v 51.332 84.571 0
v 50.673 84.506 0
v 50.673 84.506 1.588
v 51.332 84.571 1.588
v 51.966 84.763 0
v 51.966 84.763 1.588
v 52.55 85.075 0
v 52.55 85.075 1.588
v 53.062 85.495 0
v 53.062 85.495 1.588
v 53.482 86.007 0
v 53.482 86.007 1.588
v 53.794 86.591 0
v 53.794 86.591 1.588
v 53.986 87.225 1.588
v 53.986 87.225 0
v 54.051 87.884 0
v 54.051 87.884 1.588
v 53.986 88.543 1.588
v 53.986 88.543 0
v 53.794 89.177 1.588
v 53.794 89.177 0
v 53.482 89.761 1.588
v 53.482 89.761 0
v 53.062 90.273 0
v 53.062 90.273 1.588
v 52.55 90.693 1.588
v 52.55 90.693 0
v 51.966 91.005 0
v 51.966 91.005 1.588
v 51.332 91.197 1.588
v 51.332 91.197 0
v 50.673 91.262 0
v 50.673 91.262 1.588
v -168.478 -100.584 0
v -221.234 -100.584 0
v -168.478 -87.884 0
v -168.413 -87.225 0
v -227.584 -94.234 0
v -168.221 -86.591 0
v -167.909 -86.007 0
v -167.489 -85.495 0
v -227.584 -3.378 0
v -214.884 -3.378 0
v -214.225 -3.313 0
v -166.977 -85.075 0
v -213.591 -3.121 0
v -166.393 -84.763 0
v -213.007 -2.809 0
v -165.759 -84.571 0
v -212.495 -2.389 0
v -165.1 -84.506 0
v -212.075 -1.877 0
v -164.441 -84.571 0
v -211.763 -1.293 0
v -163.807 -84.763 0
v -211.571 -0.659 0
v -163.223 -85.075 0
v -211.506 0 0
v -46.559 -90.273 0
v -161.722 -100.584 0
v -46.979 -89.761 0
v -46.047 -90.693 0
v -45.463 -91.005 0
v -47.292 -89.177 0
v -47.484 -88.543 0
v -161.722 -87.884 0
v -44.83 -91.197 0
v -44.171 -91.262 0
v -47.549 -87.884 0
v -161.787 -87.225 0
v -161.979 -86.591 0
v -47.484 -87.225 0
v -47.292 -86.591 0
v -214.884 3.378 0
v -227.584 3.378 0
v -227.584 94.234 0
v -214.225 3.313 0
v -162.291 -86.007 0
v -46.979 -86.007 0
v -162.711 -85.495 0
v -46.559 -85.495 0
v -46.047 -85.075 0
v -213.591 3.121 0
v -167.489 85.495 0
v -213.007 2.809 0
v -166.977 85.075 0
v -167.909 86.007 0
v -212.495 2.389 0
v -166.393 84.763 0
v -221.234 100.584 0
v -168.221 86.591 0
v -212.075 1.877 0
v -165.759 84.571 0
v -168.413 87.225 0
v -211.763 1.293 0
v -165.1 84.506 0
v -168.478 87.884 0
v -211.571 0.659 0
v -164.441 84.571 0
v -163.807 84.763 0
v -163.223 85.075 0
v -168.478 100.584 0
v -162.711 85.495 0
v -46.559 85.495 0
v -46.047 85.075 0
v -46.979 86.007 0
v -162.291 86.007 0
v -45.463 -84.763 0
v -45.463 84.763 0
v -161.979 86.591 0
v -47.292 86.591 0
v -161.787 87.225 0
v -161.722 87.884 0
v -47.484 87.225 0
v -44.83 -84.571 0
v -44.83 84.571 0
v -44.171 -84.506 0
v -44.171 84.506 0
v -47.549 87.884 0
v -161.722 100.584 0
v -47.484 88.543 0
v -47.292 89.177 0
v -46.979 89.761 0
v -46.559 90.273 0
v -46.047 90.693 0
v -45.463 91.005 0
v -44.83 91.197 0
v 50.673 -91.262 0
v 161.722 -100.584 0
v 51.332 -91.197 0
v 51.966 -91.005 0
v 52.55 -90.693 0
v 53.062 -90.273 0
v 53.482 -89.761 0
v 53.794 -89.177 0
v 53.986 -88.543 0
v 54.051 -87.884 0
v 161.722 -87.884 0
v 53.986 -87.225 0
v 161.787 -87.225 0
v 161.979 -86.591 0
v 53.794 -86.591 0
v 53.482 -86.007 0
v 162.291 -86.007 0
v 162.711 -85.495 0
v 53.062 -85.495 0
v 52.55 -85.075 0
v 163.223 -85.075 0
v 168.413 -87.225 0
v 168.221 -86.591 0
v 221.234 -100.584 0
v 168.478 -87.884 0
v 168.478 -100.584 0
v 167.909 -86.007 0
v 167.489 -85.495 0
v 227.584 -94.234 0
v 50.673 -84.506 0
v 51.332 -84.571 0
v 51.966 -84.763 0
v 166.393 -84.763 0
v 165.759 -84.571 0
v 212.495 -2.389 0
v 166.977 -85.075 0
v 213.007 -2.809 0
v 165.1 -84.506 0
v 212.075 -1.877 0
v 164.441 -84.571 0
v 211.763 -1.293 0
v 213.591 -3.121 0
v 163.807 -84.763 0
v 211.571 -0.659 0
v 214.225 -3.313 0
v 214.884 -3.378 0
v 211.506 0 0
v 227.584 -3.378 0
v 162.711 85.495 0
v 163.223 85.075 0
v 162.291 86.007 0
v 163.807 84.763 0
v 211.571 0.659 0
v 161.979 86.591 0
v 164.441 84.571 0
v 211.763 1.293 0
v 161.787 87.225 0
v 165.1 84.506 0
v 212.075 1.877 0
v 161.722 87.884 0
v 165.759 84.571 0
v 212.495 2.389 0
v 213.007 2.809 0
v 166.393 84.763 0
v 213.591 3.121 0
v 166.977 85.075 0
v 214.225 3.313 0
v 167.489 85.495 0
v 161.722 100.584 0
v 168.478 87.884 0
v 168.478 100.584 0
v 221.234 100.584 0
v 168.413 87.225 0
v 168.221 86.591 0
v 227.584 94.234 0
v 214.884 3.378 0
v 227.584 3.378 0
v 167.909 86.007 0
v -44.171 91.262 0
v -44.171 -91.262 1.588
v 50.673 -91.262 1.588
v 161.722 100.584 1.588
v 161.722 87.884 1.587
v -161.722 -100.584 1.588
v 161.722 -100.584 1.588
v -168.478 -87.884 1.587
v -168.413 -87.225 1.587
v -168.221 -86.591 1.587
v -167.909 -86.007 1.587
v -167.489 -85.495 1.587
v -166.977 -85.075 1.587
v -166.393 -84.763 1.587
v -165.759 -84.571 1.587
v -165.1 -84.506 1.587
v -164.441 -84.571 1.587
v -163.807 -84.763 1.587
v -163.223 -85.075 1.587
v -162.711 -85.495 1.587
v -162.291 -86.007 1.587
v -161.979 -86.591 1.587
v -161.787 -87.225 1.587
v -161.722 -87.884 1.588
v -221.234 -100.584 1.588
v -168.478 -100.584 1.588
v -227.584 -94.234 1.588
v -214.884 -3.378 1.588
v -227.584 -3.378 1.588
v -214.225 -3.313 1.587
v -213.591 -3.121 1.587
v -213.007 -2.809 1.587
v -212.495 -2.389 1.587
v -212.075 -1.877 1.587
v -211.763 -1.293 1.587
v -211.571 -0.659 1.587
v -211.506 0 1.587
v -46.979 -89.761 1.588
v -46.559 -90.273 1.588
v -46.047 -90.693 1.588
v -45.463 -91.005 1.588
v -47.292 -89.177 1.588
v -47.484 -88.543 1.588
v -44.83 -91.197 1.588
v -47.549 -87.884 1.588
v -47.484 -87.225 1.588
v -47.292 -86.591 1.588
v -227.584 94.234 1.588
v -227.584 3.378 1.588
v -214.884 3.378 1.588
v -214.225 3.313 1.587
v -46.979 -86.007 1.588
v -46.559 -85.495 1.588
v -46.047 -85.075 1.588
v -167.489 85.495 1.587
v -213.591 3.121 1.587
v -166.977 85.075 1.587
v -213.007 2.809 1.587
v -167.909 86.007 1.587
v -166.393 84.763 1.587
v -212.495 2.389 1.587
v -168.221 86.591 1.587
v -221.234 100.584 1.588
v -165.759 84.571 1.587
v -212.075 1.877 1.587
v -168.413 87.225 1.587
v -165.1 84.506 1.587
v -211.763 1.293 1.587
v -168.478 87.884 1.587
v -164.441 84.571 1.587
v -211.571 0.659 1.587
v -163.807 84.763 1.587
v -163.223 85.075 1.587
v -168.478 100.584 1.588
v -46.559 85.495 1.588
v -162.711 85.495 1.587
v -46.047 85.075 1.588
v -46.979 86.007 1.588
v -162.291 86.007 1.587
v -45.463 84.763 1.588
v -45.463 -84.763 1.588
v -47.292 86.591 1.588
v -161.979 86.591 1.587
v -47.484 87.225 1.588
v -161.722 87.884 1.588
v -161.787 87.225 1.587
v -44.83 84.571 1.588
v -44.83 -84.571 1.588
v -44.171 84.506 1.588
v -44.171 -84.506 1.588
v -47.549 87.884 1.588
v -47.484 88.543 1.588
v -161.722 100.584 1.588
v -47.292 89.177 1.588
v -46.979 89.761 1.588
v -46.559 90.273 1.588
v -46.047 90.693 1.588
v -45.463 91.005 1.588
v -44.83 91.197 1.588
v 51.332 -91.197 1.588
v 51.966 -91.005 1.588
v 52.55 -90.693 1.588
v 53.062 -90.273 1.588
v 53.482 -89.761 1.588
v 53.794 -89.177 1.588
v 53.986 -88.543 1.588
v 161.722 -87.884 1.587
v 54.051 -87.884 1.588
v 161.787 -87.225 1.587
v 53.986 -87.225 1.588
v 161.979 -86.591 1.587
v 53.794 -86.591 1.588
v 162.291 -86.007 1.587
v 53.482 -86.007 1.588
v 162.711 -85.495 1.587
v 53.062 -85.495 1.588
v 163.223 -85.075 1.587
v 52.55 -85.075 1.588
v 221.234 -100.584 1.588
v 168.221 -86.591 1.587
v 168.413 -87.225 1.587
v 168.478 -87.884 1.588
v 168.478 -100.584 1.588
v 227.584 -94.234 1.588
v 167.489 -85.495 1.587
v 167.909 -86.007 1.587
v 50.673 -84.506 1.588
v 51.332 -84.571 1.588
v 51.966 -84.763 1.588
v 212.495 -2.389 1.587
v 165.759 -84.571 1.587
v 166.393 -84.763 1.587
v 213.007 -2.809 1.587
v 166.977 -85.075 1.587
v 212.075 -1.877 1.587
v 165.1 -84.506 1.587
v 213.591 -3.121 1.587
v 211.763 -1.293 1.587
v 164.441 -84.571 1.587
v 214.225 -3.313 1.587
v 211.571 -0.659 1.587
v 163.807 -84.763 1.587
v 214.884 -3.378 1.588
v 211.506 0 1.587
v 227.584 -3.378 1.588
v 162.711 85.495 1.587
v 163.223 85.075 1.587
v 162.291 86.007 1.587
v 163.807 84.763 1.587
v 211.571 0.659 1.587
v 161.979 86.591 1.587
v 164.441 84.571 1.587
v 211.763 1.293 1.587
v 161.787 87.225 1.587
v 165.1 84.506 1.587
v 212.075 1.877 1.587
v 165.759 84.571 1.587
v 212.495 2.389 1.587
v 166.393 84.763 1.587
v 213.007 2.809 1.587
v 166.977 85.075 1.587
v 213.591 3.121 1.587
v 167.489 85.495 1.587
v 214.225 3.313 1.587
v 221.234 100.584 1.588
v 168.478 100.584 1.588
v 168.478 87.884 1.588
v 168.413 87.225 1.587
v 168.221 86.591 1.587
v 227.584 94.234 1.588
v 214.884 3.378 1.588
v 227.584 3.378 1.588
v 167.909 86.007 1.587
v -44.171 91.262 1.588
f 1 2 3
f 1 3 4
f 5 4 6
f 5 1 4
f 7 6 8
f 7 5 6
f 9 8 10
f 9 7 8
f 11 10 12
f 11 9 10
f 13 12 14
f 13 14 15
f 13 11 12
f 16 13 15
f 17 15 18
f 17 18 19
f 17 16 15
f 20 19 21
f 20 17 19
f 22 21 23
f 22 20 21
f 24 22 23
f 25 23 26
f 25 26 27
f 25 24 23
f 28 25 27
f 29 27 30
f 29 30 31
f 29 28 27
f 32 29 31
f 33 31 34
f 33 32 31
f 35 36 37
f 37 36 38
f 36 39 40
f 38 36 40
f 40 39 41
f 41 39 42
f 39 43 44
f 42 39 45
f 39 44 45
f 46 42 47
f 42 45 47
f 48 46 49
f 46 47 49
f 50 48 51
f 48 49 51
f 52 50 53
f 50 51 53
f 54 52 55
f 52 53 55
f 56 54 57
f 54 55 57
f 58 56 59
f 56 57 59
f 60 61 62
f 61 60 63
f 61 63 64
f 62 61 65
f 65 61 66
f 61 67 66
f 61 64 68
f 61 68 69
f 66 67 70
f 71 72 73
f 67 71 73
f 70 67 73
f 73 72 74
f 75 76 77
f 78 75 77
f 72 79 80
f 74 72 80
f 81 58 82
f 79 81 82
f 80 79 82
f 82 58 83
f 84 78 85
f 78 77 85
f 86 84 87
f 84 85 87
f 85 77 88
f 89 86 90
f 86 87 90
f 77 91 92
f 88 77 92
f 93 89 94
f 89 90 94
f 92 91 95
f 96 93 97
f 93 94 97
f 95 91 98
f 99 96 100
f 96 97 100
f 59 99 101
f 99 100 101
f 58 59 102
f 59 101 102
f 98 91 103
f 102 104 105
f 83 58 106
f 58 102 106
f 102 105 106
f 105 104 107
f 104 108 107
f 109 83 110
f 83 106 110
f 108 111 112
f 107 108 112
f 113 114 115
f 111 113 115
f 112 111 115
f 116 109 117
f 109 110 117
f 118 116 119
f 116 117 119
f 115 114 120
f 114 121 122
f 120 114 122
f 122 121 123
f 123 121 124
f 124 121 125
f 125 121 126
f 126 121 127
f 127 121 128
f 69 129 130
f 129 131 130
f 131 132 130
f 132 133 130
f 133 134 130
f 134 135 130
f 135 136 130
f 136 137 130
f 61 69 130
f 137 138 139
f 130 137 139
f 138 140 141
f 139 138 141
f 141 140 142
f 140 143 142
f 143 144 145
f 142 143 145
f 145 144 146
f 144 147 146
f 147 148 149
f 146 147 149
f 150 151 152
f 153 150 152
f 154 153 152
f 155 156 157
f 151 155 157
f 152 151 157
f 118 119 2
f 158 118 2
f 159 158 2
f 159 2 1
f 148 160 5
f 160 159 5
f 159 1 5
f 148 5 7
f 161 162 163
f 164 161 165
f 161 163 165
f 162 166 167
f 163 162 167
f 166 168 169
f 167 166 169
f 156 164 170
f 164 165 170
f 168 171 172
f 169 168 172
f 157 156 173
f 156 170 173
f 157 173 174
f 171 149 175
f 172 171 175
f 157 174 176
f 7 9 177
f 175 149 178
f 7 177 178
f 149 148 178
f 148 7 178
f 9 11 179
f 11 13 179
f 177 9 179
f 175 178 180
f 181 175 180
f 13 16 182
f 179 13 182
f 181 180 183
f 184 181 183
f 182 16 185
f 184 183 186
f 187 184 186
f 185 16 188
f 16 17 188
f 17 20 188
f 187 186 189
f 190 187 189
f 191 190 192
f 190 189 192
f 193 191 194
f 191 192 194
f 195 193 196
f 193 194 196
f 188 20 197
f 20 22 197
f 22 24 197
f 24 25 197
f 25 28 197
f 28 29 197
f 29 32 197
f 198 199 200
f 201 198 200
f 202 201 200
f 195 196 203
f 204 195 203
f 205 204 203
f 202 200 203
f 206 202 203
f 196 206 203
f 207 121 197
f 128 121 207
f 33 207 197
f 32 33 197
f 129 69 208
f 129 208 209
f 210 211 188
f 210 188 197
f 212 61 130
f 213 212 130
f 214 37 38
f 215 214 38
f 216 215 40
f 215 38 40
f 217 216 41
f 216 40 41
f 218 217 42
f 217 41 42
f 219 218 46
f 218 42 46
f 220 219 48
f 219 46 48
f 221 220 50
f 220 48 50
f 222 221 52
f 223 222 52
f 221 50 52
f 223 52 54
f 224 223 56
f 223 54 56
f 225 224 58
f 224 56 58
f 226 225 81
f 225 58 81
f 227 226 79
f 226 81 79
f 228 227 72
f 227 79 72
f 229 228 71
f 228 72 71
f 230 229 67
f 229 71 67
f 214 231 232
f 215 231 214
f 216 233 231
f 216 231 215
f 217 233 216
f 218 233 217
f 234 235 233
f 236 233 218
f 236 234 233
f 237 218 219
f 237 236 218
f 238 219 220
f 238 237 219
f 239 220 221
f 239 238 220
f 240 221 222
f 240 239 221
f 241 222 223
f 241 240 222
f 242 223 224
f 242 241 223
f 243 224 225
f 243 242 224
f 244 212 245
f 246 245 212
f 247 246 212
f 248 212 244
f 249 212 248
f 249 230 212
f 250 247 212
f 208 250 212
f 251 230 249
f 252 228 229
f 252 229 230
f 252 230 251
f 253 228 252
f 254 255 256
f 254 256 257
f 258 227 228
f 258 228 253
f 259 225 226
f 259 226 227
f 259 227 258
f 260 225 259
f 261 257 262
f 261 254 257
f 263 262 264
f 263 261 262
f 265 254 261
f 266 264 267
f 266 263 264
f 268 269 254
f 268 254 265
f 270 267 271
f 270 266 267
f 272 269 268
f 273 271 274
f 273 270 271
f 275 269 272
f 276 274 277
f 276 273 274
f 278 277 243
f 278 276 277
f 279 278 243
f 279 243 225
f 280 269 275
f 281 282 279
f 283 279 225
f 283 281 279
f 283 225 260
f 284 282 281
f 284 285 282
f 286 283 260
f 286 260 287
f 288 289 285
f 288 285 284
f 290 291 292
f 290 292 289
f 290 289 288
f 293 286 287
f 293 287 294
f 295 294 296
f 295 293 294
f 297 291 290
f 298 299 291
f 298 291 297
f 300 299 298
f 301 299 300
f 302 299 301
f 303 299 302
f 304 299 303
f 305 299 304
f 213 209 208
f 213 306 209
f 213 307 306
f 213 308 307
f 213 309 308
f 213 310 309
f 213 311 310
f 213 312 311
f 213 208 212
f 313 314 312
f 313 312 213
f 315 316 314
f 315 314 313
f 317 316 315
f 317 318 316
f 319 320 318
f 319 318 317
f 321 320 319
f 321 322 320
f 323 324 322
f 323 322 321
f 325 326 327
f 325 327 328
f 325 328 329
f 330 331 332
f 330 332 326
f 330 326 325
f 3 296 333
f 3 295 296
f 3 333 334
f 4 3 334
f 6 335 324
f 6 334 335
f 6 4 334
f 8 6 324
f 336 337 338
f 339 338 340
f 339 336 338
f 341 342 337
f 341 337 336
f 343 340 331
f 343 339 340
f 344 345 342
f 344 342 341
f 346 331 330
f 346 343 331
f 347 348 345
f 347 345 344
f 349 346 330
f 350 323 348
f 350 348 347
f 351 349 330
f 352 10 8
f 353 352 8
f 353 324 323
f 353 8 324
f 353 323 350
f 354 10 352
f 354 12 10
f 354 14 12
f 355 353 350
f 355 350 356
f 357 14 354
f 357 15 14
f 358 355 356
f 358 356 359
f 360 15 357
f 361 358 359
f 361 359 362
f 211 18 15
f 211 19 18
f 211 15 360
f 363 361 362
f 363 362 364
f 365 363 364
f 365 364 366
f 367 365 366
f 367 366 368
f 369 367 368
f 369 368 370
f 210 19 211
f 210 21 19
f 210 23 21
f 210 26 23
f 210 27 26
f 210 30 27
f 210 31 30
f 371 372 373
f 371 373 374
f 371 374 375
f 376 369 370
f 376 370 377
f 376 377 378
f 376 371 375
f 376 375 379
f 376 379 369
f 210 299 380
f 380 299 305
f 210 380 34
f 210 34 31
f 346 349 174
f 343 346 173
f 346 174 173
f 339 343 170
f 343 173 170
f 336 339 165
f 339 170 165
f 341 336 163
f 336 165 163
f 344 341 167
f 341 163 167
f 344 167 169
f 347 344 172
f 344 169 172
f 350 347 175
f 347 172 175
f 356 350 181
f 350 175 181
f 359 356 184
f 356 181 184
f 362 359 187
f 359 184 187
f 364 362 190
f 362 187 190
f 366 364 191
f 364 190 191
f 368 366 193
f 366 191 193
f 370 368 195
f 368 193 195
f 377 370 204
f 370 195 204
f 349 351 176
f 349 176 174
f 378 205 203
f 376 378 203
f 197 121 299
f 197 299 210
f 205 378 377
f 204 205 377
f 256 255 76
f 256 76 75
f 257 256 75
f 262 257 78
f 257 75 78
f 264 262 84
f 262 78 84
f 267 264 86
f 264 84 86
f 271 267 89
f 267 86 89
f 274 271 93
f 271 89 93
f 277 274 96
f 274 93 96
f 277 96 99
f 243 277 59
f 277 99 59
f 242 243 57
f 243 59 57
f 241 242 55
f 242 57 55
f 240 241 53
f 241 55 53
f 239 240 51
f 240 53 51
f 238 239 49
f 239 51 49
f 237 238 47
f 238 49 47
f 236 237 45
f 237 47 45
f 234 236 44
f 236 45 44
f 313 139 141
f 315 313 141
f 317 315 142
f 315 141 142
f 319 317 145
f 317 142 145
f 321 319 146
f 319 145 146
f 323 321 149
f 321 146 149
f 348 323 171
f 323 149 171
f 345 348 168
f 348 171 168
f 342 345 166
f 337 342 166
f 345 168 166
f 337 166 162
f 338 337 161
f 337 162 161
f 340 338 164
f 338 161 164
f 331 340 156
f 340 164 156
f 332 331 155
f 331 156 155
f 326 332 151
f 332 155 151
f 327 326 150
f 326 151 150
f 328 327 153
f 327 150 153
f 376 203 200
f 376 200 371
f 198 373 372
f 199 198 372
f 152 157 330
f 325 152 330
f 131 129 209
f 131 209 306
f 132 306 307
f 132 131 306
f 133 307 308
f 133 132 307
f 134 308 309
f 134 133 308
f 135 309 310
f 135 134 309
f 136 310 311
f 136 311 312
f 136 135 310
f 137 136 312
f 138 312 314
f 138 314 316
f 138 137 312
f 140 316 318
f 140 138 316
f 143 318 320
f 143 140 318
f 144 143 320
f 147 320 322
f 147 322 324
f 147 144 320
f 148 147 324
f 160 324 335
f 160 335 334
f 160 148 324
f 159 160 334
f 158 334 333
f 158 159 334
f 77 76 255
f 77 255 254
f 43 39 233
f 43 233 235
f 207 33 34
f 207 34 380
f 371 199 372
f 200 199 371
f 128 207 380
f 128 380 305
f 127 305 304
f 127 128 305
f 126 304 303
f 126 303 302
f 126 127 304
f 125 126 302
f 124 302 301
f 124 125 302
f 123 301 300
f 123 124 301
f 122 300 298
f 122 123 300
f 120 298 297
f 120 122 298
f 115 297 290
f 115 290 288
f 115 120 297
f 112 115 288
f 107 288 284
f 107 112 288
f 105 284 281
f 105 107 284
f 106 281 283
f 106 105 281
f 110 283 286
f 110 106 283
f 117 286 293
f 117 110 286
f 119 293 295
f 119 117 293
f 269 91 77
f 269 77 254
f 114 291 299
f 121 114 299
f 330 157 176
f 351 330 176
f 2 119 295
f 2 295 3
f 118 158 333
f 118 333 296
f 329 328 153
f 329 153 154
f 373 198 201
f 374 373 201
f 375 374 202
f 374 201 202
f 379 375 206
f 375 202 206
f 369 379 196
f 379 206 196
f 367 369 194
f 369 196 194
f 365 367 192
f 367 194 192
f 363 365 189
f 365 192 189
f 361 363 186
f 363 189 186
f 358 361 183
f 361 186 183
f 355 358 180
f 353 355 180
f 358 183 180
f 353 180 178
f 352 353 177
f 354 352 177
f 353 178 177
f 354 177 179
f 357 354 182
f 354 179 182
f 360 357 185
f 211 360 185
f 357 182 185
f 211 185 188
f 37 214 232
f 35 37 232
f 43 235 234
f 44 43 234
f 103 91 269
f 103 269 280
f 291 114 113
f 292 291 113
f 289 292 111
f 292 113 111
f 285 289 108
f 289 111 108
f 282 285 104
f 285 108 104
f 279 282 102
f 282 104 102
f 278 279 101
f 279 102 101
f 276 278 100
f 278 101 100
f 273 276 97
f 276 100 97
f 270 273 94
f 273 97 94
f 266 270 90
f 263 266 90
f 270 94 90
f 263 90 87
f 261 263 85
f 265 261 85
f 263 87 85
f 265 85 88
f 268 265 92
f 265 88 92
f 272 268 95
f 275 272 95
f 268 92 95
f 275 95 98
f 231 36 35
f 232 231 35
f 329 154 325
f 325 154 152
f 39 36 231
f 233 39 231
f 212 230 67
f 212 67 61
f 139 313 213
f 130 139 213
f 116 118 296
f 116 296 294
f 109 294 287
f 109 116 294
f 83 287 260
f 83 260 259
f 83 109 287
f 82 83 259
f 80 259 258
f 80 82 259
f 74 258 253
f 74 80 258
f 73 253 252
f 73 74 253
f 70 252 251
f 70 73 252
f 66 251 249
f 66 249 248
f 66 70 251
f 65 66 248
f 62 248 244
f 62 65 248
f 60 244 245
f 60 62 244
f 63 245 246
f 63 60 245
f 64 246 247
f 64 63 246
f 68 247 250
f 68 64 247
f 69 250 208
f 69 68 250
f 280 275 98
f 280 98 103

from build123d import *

# Parameters (mm, degrees)
SKETCH1_W                   = 455.168
SKETCH1_H                   = 201.168
BOSS_EXTRUDE1_DEPTH         = 1.5875
F_1_4_CLEARANCE_HOLE1_D     = 6.7564
F_1_4_CLEARANCE_SLOT1_DEPTH = 1.5875
CHAMFER1_SIZE               = 6.35
CUT_EXTRUDE1_REACH          = 250.826
SKETCH6_W                   = 6.7564
SKETCH6_H                   = 14.478
CUT_EXTRUDE2_REACH          = 250.826
SKETCH7_W                   = 14.478
SKETCH7_H                   = 6.7564


# Read off the part's stored shape, not the designer's step: 1/4 Clearance Slot1
with BuildPart() as part:
    # Sketch1 → Boss-Extrude1 (new body)
    with BuildSketch(Plane.XY):
        Rectangle(SKETCH1_W, SKETCH1_H)
    extrude(amount=BOSS_EXTRUDE1_DEPTH)

    # 1/4 Clearance Hole1 (through all)
    with Locations(Plane.XY.offset(1.5875)):
        with Locations((-165.1, 87.884), (165.1, 87.884), (214.884, 0), (-214.884, 0), (-165.1, -87.884), (165.1, -87.884)):
            Hole(F_1_4_CLEARANCE_HOLE1_D / 2)

    # 1/4 Clearance Slot1 outline → 1/4 Clearance Slot1 (cut)
    with BuildSketch(Plane.XY):
        with BuildLine():
            Line((-44.1706, 84.5058), (50.673, 84.5058))
            ThreePointArc((50.673, 84.5058), (54.0512, 87.884), (50.673, 91.2622))
            Line((50.673, 91.2622), (-44.1706, 91.2622))
            ThreePointArc((-44.1706, 91.2622), (-47.5488, 87.884), (-44.1706, 84.5058))
        make_face()
        with BuildLine():
            Line((-44.1706, -91.2622), (50.673, -91.2622))
            ThreePointArc((50.673, -91.2622), (54.0512, -87.884), (50.673, -84.5058))
            Line((50.673, -84.5058), (-44.1706, -84.5058))
            ThreePointArc((-44.1706, -84.5058), (-47.5488, -87.884), (-44.1706, -91.2622))
        make_face()
    extrude(amount=F_1_4_CLEARANCE_SLOT1_DEPTH, mode=Mode.SUBTRACT)

    # Chamfer1
    chamfer1_edges = [part.edges().sort_by_distance(p)[0] for p in [
        (227.584, -100.584, 0.79375),
        (-227.584, -100.584, 0.79375),
        (-227.584, 100.584, 0.79375),
        (227.584, 100.584, 0.79375),
    ]]
    chamfer(chamfer1_edges, length=CHAMFER1_SIZE)

    # Sketch6 → Cut-Extrude1 (cut, up to next)
    with BuildSketch(Plane.XY.offset(1.5875), mode=Mode.PRIVATE) as cut_extrude1_sk1:
        with Locations((-165.1, 95.123)):
            Rectangle(SKETCH6_W, SKETCH6_H)
    cut_extrude1_tool1 = extrude(cut_extrude1_sk1.sketch, amount=-CUT_EXTRUDE1_REACH, mode=Mode.PRIVATE) & part.part
    # Sketch6 → Cut-Extrude1 (cut, up to next)
    with BuildSketch(Plane.XY.offset(1.5875), mode=Mode.PRIVATE) as cut_extrude1_sk2:
        with Locations((165.1, 95.123)):
            Rectangle(SKETCH6_W, SKETCH6_H)
    cut_extrude1_tool2 = extrude(cut_extrude1_sk2.sketch, amount=-CUT_EXTRUDE1_REACH, mode=Mode.PRIVATE) & part.part
    cut_extrude1_1 = cut_extrude1_tool1.solids().sort_by_distance((-165.1, 95.123, 1.5875))[0]
    add(cut_extrude1_1, mode=Mode.SUBTRACT)
    cut_extrude1_2 = cut_extrude1_tool2.solids().sort_by_distance((165.1, 95.123, 1.5875))[0]
    add(cut_extrude1_2, mode=Mode.SUBTRACT)
    cut_extrude1 = cut_extrude1_1 + cut_extrude1_2  # Cut-Extrude1 as one shape, for the pattern or mirror that repeats it

    # Mirror1: Cut-Extrude1 across plane
    add(cut_extrude1.mirror(Plane.ZX), mode=Mode.SUBTRACT)

    # Sketch7 → Cut-Extrude2 (cut, up to next)
    with BuildSketch(Plane.XY.offset(1.5875), mode=Mode.PRIVATE) as cut_extrude2_sk1:
        with Locations((-222.123, 0)):
            Rectangle(SKETCH7_W, SKETCH7_H)
    cut_extrude2_tool1 = extrude(cut_extrude2_sk1.sketch, amount=-CUT_EXTRUDE2_REACH, mode=Mode.PRIVATE) & part.part
    cut_extrude2 = cut_extrude2_tool1.solids().sort_by_distance((-222.123, 0, 1.5875))[0]
    add(cut_extrude2, mode=Mode.SUBTRACT)

    # Mirror2: Cut-Extrude2 across plane
    add(cut_extrude2.mirror(Plane(origin=(0, 0, 0), x_dir=(0, 0, 1), z_dir=(1, 0, 0))), mode=Mode.SUBTRACT)


solid = part.part
